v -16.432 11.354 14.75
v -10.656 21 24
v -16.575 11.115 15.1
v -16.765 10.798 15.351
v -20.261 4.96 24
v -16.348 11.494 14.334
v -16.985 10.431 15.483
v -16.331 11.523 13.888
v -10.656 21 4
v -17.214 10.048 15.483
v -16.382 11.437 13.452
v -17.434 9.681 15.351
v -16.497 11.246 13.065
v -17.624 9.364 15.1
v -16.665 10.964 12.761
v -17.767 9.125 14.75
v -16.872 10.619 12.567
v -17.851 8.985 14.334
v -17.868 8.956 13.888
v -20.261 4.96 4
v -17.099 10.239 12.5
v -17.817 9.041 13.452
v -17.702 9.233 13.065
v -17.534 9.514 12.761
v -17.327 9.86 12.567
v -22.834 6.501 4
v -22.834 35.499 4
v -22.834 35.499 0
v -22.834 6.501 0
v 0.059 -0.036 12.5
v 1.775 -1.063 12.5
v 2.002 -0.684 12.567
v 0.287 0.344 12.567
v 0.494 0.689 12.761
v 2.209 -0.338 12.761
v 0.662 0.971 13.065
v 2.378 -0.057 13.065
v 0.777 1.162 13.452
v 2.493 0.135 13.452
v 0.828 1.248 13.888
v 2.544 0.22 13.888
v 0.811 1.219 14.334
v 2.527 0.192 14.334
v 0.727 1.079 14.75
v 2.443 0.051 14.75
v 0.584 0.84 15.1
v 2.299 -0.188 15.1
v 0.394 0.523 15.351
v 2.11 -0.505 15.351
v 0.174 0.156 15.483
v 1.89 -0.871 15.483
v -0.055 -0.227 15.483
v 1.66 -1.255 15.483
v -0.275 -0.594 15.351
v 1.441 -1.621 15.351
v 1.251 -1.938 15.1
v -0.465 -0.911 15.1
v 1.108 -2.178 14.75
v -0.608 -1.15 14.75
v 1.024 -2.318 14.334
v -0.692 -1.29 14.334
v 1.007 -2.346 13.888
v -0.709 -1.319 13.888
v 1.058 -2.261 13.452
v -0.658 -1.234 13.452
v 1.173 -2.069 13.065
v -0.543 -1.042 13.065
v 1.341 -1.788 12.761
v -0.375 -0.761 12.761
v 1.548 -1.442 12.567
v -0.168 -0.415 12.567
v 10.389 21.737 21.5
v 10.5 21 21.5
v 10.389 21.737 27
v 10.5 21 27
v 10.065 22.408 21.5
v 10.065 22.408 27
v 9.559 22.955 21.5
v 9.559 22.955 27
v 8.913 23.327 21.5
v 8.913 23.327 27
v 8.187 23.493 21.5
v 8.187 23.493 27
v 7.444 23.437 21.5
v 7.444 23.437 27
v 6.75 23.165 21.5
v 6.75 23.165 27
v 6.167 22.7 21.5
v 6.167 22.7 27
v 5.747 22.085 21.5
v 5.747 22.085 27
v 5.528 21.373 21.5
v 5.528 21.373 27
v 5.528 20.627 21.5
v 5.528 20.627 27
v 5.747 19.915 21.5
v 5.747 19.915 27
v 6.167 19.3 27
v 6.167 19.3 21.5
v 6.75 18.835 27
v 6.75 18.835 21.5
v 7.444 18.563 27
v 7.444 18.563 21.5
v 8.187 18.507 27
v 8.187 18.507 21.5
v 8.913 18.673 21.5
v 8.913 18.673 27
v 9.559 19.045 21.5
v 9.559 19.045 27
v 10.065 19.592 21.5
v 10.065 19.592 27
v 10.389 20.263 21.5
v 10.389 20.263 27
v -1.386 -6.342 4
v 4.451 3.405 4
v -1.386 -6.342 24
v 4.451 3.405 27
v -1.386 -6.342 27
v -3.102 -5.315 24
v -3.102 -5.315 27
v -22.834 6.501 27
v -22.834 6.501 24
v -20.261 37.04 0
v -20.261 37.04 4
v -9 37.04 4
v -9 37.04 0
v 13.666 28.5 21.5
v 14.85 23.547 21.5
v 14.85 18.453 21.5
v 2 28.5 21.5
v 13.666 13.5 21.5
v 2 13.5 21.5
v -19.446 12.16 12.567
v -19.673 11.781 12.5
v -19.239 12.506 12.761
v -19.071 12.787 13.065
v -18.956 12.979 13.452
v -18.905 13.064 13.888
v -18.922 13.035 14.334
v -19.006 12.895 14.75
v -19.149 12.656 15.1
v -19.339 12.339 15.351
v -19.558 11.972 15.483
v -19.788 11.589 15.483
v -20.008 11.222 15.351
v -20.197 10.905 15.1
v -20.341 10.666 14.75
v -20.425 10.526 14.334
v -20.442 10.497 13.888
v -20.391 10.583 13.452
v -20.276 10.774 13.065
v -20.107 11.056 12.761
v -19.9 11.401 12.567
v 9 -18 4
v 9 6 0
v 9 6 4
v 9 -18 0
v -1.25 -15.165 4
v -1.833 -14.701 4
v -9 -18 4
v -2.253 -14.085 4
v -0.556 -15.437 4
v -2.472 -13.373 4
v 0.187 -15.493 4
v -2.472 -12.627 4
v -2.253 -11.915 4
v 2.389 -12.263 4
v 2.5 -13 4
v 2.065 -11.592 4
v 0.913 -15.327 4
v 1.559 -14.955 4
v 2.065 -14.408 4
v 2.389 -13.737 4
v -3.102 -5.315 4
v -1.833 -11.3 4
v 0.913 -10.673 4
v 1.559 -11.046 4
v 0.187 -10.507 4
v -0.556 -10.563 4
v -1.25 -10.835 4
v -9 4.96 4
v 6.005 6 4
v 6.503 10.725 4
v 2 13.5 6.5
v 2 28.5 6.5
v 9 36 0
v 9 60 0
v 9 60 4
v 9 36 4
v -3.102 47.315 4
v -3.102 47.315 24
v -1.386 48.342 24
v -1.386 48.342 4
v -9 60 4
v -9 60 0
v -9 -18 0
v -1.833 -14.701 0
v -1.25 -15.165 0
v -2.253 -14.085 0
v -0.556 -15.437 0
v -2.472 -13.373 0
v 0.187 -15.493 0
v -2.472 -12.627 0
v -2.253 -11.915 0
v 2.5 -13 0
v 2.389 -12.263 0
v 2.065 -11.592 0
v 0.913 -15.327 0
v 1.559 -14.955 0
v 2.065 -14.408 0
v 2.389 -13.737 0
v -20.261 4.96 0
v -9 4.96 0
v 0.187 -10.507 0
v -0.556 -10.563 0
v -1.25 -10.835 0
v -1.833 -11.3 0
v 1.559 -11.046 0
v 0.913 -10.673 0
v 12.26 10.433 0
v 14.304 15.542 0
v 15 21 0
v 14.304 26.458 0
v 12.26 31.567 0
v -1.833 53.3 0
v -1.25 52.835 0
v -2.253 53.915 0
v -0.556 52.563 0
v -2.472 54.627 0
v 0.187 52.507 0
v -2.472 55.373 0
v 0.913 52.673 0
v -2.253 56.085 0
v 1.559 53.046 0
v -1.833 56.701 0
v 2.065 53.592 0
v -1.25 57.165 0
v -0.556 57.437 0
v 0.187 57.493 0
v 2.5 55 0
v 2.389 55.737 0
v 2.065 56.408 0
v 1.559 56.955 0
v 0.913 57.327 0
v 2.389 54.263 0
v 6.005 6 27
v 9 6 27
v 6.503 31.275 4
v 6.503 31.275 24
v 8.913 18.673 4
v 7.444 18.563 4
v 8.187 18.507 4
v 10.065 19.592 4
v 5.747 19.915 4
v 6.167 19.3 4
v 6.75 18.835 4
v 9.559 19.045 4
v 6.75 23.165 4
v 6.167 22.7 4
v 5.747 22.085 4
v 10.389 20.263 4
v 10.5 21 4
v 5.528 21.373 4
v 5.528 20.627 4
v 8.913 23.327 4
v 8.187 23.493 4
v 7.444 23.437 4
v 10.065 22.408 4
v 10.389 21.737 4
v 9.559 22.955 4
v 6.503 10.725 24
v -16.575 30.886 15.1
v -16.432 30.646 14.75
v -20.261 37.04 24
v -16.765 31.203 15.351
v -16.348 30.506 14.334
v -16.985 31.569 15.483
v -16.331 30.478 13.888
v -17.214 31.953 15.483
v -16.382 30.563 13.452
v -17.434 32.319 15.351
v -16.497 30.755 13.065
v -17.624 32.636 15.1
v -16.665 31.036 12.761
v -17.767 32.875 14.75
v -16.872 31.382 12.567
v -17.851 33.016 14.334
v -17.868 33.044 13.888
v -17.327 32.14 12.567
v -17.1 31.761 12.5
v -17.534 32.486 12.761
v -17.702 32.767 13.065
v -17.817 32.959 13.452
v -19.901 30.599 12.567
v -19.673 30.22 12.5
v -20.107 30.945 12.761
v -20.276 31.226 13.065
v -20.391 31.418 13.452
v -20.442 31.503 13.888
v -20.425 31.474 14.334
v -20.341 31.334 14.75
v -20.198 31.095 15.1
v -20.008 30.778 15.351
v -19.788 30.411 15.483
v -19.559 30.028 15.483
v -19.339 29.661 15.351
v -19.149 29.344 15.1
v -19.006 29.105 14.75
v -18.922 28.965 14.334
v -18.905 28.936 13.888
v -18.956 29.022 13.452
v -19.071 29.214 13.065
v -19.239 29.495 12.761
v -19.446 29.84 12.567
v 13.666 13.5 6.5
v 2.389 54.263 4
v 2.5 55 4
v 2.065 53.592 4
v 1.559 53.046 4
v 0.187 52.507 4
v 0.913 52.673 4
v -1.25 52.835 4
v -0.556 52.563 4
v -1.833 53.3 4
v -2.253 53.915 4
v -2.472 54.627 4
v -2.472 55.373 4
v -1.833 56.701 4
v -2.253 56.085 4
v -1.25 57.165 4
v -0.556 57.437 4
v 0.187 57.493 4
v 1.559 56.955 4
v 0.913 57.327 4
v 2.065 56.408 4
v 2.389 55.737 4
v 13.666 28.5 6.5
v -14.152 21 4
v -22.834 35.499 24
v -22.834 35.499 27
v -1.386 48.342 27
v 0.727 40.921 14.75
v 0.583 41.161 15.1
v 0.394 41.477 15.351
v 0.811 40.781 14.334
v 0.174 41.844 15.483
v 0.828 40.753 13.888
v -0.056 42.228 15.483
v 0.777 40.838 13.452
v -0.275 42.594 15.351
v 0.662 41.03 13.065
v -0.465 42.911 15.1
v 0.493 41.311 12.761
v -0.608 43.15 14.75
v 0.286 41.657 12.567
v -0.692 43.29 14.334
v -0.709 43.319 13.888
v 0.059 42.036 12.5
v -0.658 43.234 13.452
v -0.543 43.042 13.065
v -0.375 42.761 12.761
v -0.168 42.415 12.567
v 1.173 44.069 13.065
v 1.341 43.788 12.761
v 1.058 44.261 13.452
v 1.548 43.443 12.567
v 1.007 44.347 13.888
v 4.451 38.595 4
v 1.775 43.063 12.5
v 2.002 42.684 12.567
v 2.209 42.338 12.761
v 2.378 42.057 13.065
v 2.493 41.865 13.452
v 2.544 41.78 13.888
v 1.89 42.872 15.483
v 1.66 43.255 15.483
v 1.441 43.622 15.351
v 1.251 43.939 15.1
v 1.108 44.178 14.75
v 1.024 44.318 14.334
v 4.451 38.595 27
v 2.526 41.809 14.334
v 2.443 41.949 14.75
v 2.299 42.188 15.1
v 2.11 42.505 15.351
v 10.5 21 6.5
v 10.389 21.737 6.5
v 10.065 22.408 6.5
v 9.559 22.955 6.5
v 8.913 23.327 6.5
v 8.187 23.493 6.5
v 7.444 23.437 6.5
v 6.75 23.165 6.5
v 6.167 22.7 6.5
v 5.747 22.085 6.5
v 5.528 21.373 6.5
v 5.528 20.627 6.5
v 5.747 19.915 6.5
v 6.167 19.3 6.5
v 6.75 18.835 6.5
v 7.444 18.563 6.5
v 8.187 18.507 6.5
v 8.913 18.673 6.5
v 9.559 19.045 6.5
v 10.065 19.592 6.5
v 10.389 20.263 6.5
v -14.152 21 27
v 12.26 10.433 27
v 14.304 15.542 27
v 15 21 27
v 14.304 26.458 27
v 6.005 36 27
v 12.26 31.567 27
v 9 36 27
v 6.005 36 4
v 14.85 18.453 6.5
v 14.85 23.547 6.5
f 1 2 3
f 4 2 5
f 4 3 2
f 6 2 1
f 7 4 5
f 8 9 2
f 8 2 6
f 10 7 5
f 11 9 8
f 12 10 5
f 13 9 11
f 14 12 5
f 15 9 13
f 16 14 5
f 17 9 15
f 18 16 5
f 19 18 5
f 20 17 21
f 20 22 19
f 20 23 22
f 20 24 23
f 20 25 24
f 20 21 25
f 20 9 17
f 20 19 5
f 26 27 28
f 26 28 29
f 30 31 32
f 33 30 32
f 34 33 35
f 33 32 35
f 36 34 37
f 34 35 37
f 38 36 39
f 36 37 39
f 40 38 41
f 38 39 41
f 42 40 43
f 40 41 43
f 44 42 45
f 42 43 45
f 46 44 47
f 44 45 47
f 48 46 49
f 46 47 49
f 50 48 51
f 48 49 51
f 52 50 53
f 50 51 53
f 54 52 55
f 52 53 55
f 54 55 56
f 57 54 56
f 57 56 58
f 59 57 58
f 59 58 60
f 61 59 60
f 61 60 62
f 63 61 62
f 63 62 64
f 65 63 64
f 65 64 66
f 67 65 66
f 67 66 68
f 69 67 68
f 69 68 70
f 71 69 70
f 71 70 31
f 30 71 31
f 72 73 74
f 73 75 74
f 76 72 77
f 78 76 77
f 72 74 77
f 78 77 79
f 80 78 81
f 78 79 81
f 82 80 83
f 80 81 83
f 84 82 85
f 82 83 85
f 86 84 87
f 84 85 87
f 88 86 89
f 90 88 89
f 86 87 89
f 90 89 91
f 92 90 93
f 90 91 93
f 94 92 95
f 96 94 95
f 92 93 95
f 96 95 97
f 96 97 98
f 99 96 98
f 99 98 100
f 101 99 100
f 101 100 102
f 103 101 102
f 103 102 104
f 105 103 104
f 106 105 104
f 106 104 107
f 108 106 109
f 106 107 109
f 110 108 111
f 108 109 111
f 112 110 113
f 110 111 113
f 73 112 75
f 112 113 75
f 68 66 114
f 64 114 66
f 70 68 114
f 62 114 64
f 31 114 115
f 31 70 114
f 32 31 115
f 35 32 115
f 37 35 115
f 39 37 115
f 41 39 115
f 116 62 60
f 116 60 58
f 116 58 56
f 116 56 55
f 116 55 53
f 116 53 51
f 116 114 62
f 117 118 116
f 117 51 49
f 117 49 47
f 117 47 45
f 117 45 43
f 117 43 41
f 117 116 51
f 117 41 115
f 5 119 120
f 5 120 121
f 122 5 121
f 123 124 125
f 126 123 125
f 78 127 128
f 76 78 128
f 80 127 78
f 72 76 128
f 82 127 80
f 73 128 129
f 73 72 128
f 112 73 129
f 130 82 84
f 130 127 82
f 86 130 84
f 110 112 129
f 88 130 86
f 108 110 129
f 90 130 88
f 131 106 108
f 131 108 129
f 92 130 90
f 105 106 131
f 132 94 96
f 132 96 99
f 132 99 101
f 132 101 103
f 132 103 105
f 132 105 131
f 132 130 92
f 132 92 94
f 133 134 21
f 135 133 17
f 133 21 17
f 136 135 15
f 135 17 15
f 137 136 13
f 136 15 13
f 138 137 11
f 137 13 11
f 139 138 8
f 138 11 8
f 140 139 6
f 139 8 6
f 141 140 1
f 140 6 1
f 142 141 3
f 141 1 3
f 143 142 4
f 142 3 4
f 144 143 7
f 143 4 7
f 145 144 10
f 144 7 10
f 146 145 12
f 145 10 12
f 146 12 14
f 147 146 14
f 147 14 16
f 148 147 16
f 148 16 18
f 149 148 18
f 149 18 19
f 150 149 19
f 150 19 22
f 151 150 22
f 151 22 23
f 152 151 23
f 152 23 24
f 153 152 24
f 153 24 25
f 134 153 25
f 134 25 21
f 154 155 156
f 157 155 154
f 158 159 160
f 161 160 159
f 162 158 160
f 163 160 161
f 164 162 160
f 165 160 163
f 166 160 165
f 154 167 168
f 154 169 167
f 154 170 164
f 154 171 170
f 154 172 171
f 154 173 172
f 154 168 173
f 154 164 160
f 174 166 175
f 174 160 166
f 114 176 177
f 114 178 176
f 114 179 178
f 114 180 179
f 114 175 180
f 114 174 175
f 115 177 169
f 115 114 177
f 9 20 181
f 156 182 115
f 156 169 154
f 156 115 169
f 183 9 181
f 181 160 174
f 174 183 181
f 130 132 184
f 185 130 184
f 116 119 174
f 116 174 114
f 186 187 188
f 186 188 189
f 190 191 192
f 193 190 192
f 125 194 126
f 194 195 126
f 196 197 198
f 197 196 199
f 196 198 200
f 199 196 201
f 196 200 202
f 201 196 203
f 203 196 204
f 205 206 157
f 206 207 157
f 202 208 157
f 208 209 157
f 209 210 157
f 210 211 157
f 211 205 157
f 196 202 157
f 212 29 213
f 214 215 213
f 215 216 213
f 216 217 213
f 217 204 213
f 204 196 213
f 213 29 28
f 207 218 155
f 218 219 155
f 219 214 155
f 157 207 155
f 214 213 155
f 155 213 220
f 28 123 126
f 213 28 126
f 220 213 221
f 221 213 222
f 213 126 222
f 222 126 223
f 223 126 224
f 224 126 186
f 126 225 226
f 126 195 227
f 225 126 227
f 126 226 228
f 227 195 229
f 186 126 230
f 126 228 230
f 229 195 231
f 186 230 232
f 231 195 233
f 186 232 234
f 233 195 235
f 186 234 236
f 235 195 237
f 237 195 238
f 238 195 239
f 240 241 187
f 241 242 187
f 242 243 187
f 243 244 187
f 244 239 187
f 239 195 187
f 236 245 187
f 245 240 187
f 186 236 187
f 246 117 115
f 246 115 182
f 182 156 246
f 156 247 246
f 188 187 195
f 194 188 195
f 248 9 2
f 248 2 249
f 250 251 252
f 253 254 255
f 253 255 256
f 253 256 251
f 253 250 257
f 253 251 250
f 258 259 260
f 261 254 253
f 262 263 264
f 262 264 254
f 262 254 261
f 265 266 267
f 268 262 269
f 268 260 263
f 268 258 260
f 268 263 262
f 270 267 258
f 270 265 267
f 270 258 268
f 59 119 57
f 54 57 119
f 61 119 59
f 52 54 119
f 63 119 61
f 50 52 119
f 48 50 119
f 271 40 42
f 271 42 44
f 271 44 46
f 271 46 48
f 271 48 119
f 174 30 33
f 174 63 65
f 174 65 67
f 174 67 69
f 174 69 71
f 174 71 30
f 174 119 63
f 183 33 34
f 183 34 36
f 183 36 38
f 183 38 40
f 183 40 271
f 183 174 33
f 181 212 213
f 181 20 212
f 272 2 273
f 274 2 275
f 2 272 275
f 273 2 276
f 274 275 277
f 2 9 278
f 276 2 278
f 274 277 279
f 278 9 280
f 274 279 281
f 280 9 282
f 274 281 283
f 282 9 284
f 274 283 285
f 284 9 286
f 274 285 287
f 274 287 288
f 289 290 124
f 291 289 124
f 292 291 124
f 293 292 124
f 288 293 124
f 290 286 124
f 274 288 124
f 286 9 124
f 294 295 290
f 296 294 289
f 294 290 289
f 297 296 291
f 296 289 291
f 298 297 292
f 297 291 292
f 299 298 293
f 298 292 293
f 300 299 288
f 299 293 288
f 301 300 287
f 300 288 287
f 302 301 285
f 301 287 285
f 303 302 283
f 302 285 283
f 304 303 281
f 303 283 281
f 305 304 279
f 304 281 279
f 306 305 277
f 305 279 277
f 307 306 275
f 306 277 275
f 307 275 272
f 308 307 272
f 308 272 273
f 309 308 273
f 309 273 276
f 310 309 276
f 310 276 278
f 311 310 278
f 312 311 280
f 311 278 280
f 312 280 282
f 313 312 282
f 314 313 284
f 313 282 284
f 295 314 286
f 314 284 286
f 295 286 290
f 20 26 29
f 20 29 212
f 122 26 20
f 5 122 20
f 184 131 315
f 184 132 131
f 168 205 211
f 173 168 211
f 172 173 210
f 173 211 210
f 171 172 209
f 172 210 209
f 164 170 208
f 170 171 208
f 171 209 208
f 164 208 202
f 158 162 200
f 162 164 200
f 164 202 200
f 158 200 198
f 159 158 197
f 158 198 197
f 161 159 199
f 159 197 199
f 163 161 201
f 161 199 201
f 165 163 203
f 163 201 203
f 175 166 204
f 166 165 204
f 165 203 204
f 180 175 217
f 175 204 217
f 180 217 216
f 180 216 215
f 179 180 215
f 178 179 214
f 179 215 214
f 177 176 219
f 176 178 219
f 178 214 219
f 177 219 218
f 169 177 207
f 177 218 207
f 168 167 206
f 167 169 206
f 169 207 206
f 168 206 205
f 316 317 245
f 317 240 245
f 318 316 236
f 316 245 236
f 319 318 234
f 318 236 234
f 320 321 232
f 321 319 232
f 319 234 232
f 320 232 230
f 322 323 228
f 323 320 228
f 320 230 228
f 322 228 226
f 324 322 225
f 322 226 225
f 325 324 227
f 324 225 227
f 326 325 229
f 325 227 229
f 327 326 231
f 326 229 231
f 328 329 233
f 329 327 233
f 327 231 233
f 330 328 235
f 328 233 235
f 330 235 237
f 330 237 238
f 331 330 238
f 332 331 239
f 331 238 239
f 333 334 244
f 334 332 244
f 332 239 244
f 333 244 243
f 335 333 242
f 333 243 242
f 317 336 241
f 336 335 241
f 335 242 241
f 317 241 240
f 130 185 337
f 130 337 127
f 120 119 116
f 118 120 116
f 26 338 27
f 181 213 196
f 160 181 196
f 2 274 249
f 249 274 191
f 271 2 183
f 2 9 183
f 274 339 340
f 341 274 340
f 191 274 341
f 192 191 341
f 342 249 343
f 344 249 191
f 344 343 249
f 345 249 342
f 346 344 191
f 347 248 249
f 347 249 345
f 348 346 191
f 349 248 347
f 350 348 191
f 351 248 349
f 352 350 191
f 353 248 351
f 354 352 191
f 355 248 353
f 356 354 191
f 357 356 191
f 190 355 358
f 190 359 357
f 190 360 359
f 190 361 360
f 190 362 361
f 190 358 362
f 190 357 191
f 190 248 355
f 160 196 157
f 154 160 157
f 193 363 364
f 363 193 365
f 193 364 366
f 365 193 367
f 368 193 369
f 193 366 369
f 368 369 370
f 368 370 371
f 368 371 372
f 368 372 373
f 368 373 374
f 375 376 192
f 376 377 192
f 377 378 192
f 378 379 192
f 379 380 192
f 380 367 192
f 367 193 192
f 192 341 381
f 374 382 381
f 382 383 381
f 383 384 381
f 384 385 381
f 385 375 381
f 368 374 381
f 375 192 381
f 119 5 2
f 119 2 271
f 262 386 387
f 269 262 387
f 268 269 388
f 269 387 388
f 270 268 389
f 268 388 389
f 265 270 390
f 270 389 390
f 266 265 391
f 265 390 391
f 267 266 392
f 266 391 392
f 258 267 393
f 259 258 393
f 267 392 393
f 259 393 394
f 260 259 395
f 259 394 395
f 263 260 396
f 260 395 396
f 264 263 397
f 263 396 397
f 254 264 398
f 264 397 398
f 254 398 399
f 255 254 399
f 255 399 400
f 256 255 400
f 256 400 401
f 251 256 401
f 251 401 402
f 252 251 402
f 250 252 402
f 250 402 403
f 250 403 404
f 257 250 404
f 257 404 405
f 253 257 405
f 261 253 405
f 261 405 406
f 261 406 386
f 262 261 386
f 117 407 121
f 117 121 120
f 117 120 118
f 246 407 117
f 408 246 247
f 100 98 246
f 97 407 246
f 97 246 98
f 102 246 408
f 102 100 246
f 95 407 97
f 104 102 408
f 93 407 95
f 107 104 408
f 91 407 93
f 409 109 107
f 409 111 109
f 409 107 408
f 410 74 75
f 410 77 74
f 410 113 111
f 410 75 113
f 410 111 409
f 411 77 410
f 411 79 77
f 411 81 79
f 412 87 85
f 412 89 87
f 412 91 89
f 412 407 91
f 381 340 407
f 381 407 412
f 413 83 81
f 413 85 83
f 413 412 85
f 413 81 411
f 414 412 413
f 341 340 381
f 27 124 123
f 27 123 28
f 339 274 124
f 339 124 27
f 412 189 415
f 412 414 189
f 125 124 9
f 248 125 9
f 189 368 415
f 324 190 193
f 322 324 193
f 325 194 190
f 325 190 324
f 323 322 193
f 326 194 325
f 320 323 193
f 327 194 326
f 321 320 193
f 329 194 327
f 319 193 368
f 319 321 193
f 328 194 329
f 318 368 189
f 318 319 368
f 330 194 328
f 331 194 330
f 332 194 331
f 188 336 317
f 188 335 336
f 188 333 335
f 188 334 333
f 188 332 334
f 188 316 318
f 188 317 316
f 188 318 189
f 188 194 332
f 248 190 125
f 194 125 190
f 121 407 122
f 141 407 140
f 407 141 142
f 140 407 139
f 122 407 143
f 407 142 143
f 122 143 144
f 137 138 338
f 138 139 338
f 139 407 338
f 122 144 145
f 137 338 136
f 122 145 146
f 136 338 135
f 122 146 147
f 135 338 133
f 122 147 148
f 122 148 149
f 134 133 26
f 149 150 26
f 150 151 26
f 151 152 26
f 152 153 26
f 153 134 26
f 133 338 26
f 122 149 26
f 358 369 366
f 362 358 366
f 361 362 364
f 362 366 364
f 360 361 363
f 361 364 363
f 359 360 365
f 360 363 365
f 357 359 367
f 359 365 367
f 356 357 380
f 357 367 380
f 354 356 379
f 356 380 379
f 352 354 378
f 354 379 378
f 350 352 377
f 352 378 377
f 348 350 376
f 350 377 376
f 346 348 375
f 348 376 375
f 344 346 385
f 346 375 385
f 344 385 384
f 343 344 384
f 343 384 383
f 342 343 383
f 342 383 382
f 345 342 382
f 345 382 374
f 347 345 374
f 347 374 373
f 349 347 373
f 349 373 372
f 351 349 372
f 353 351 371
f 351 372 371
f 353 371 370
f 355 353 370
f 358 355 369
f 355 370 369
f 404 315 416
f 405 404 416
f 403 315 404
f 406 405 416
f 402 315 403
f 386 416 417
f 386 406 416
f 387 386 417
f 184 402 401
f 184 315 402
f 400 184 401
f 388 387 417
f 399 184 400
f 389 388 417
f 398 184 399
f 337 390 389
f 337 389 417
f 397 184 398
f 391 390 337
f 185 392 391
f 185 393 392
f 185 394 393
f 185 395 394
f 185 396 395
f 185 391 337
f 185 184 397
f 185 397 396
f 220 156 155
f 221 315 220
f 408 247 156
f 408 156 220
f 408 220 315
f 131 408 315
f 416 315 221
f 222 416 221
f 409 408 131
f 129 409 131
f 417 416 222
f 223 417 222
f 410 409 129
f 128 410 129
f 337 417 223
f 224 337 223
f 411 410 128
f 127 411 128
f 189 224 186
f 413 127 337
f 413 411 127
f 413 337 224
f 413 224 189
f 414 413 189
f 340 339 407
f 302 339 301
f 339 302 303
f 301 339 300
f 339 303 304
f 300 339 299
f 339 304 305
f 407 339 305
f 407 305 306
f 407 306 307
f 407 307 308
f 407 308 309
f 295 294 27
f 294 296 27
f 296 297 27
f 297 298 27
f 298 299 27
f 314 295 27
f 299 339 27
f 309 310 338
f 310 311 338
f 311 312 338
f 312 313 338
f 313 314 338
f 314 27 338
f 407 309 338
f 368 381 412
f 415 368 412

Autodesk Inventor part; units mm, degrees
ref_plane "YZ Plane" through (0, 0, 0) normal (1, 0, 0) x (0, 1, 0)
sketch "Sketch1" plane through (0, 0, 0) normal (0, 0, 1) x (1, 0, 0)
  circle A0 centre (-0.0001, 55.0001) radius 2.5 projected
  line L0 (-9, 60.0001) -> (-9, 34.0001) projected
  line L1 (-9, 34.0001) -> (-5.0001, 34.0001) projected
  line L2 (-5.0001, 34.0001) -> (-5.0001, 45.0001) projected
  line L3 (-5.0001, 45.0001) -> (4.9999, 45.0001) projected
  line L4 (4.9999, 45.0001) -> (4.9999, 34.0001) projected
  line L5 (4.9999, 34.0001) -> (8.9999, 34.0001) projected
  line L6 (8.9999, 34.0001) -> (8.9999, 60.0001) projected
  line L7 (8.9999, 60.0001) -> (-9, 60.0001) projected
  line L8 (-9, 8) -> (-9, -18) projected
  line L9 (-5, -18) -> (-5, -8) projected
  circle A1 centre (-0.0001, -13.0001) radius 2.5 projected
  line L10 (8.9999, -18.0001) -> (8.9999, 7.9999) projected
  line L11 (8.9999, 7.9999) -> (4.9999, 7.9999) projected
  line L12 (4.9999, 7.9999) -> (4.9999, 2.5001) projected
  line L13 (5, -3) -> (-5.0001, -3.0001) projected
  line L14 (-5.0001, -3.0001) -> (-5.0001, 7.9999) projected
  line L15 (-5.0001, 7.9999) -> (-9, 7.9999) projected
  line L16 (-9, -18.0001) -> (8.9999, -18.0001) projected
  line L17 (8.9999, 60.0001) -> (-9, 60.0001)
  line L18 (-9, 60.0001) -> (-9, -18)
  line L19 (-9, -18) -> (8.9999, -18)
  line L20 (8.9999, -18) -> (8.9999, 60.0001)
  circle A2 centre (-0.0001, 55.0001) radius 2.5
  circle A3 centre (-0.0001, -13.0001) radius 2.5
  line L21 (-9, 7.9999) -> (-9, -18.0001) projected
  line L22 (4.9999, 2.5001) -> (5, -3) projected
  point P0 (0, 0)
  dimension "d0" = 4
  dimension "d1" = 0
extrude "Extrusion1" add sketch "Sketch1" along normal blind 4
sketch "Sketch2" plane through (0, 0, 4) normal (0, 0, 1) x (1, 0, 0)
  circle A0 centre (-55.3, -73.0192) radius 2.5 projected
  circle A1 centre (-55.3001, 115.0193) radius 2.5 projected
  line L0 (-55.3, -73.0192) -> (33.584, 75.4143)
  line L1 (-55.3001, 115.0193) -> (26.1085, -20.9304)
  line L2 (-9, 60) -> (-9, -18) projected
  line L3 (-9, 21) -> (62.9573, 21)
  line L4 (1, 21) -> (-7.5794, 15.8625)
  line L5 (-55.3001, 115.0193) -> (-50.1626, 106.4399)
  line L6 (-50.1626, 106.4399) -> (-41.5832, 111.5774)
  line L7 (-50.1626, 106.4399) -> (-58.742, 101.3024)
  line L8 (-7.5794, 15.8625) -> (-58.742, 101.3024)
  line L9 (1, 21) -> (9.5794, 26.1375)
  line L10 (9.5794, 26.1375) -> (-41.5832, 111.5774)
  line L11 (1, 21) -> (-7.5794, 26.1375)
  line L12 (1, 21) -> (9.5794, 15.8625)
  line L13 (-55.3, -73.0192) -> (-50.1625, -64.4398)
  line L14 (-93.1275, -68.5) -> (-47.8, -94.6699) projected
  line L15 (-50.1625, -64.4398) -> (-41.5831, -69.5773)
  line L16 (-50.1625, -64.4398) -> (-58.742, -59.3023)
  line L17 (-41.5831, -69.5773) -> (9.5794, 15.8625)
  line L18 (-7.5794, 26.1375) -> (-58.742, -59.3023)
  line L19 (-10.6558, 21) -> (6.503, 31.2749)
  line L20 (-10.6558, 21) -> (6.503, 10.7251)
  circle A2 centre (-0.0001, -13.0001) radius 2.5 projected
  circle A3 centre (-0.0001, -13.0001) radius 5
  circle A4 centre (-0.0001, 55.0001) radius 2.5 projected
  circle A5 centre (-0.0001, 55.0001) radius 5
  line L21 (8.9999, 60.0001) -> (-9, 60.0001) projected
  line L22 (-9, -18.0001) -> (8.9999, -18.0001) projected
  line L23 (-20.2607, 4.9602) -> (12.7451, -14.8042)
  line L24 (-20.2607, 37.0398) -> (12.7451, 56.8042)
  line L25 (-20.2607, 4.9602) -> (-22.8345, 6.5014)
  line L26 (-9, 21) -> (-33.1607, 21)
  line L27 (-22.8345, 6.5014) -> (-14.1525, 21)
  line L28 (-20.2607, 37.0398) -> (-22.8345, 35.4986)
  line L29 (-22.8345, 35.4986) -> (-14.1525, 21)
  line L30 (6.503, 10.7251) -> (8.9999, 9.2299)
  line L31 (8.9999, -18.0001) -> (8.9999, 60.0001) projected
  line L32 (6.503, 31.2749) -> (8.9999, 32.7701)
  line L33 (8.9999, 32.7701) -> (-0.605, 48.8099)
  line L34 (8.9999, 9.2299) -> (-0.605, -6.8099)
  line L35 (8.9999, 32.7701) -> (8.9999, 9.2299)
  line L36 (-22.8345, 6.5014) -> (-22.8345, 35.4986)
  point P0 (0, 0)
  point P1 (-20.2607, 37.0398)
  point P2 (6.503, 10.7251)
  point P3 (-3.1018, -5.3148)
  point P4 (8.524, 8.4352)
  point P5 (7.516, 10.1185)
  point P6 (-3.1019, 47.3148)
  point P7 (6.503, 31.2749)
  point P8 (-2.0764, 26.1375)
  point P9 (-11.6813, 42.1773)
  point P10 (6.8279, 11.2676)
  point P11 (8.9999, 14.8947)
  point P12 (8.9999, 16.2096)
  point P13 (6.503, 10.7251)
  point P14 (8.9999, 25.7904)
  point P15 (6.503, 31.2749)
  point P16 (8.9999, 27.1053)
  point P17 (8.9999, 32.7701)
  point P18 (8.9999, 32.7704)
  point P19 (8.9999, 9.2299)
  point P20 (8.9999, 7.6404)
  point P21 (8.9999, 9.2296)
  point P22 (8.9999, 54.5615)
  point P23 (8.9999, -12.5615)
  dimension "d0" = 4
  dimension "d1" = 0
  dimension "d2" = 10
  dimension "d3" = 10
  dimension "d4" = 10
  dimension "d5" = 10
  dimension "d6" = 10
  dimension "d7" = 10
  dimension "d8" = 10
  dimension "d9" = 10
  dimension "d10" = 10
  dimension "d11" = 10
  dimension "d12" = 10
  dimension "d13" = 20
  dimension "d14" = 20
  dimension "d15" = 3
  dimension "d16" = 3
extrude "Extrusion2" add sketch "Sketch2" along normal blind 20 contours L25 L27 L26 L18 | L20 L4 L0 | L0 L1 L17 L20 | L26 L29 L28 L8 | L26 L2 L20 | L19 L2 L26 | L17 L30 L1 L34 L23 | L1 L19 L10 L0 | L11 L19 L1 | L12 L31 L17 L1 | L4 L20 L2 L3 | L9 L31 L3 | L0 L10 L31 L9 | L3 L2 L19 L11 | L3 L31 L12 | L17 L1 L30 | L34 L1 L31 L23 | L10 L32 L0 | L0 L32 L31 L10 | L17 L31 L30 L1 | L30 L34 L1 | L34 L31 L1 | L32 L10 L24 L33 L0 | L0 L33 L32 | L33 L24 L31 L0 | L0 L31 L33
sketch "Sketch3" plane through (0, 0, 4) normal (0, 0, -1) x (-1, 0, 0)
  line L0 (10.6558, 21) -> (20.2607, 37.0398) projected
  line L1 (20.2607, 37.0398) -> (8.9915, 37.0398)
  line L2 (20.2607, 4.9602) -> (10.6558, 21) projected
  line L3 (20.2607, 4.9602) -> (9, 4.9602)
  line L4 (9, 20.0085) -> (9, -18) projected
  line L5 (22.8345, 35.4986) -> (14.1525, 21) projected
  line L6 (22.8345, 6.5014) -> (20.2607, 4.9602) projected
  line L7 (22.8345, 35.4986) -> (22.8345, 6.5014)
  line L8 (9, 60) -> (9, -18) projected
  line L9 (10.6558, 21) -> (9, 20.0085) projected
  line L10 (9, 21.9915) -> (10.6558, 21) projected
  line L11 (22.8345, 6.5014) -> (20.2607, 4.9602) projected
  line L12 (14.1525, 21) -> (22.8345, 6.5014) projected
  line L13 (22.8345, 35.4986) -> (14.1525, 21) projected
  line L14 (20.2607, 37.0398) -> (22.8345, 35.4986) projected
  line L15 (10.6558, 21) -> (20.2607, 37.0398) projected
  line L16 (20.2607, 4.9602) -> (10.6558, 21) projected
  line L17 (-8.9999, 60.0001) -> (9, 60.0001) projected
  line L18 (-8.9999, -18.0001) -> (-8.9999, 60.0001) projected
  line L19 (9, -18.0001) -> (-8.9999, -18.0001) projected
  circle A0 centre (0.0001, -13.0001) radius 2.5 projected
  circle A1 centre (0.0001, 55.0001) radius 2.5 projected
  line L20 (9, 60.0001) -> (9, -18.0001) projected
  point P0 (0, 0)
  point P1 (9, 37.0398)
  dimension "d0" = 4
  dimension "d1" = 0
ref_plane "Work Plane1" through (-20.2583, -25.7942, 0) normal (0, 0, 1) x (1, 0, 0)
extrude "Extrusion3" add sketch "Sketch3" along normal up to surface (4 mm away) contours L10 L8 L1 L0 | L0 L14 L5 L12 L6 L2 | L2 L3 L4 L9 | L9 L8 L10 | L7 L12 L5
ref_plane "Work Plane4" through (8.9999, -18.0001, 0) normal (1, 0, 0) x (0, 0, -1)
sketch "Sketch12" plane through (0, 0, 24) normal (0, 0, 1) x (1, 0, 0)
  line L0 (-3.1018, -5.3148) -> (8.9999, -12.5615) projected
  line L1 (-14.1525, 21) -> (-22.8345, 6.5014) projected
  line L2 (8.9999, -12.5615) -> (-22.8345, 6.5014)
  line L3 (-22.8345, 6.5014) -> (-14.1525, 21)
  line L4 (-22.8345, 35.4986) -> (-14.1525, 21) projected
  line L5 (-14.1525, 21) -> (-22.8345, 35.4986)
  line L6 (-22.8345, 35.4986) -> (8.9999, 54.5615)
  line L7 (8.9999, 54.5615) -> (8.9999, -12.5615)
  point P0 (0, 0)
extrude "Extrusion12" add sketch "Sketch12" along normal blind 3
sketch "Sketch13" plane through (0, 0, 27) normal (0, 0, 1) x (1, 0, 0)
  line L0 (8.9999, -12.5615) -> (8.9999, 54.5615) projected
  line L1 (8.9999, 21) -> (14.9999, 21)
  line L2 (8.9999, 21) -> (8.9999, 6)
  line L3 (8.9999, 21) -> (8.9999, 36)
  arc A0 (8.9999, 6) -> (8.9999, 36) centre (-6.7501, 21) ccw
  point P0 (0, 0)
  dimension "d52" = 6
  dimension "d53" = 15
  dimension "d54" = 15
extrude "Extrusion13" add sketch "Sketch13" against normal up to surface (27 mm away)
sketch "Sketch14" plane through (0, 0, 27) normal (0, 0, 1) x (1, 0, 0)
  arc A0 (8.9999, 6) -> (8.9999, 36) centre (-6.7501, 21) ccw projected
  line L0 (14.9999, 21) -> (7.9999, 21)
  circle A1 centre (7.9999, 21) radius 2.5
  point P0 (0, 0)
  dimension "d57" = 7
  dimension "d58" = 5
extrude "Extrusion14" cut sketch "Sketch14" against normal up to surface (23 mm away)
sketch "Sketch15" plane through (8.9999, -18.0001, 4) normal (1, 0, 0) x (0, 0, -1)
  line L0 (-23, 54.0001) -> (-23, 24.0001) projected
  line L1 (-23, 39.0001) -> (-10, 39.0001)
  line L2 (0, 39.0001) -> (-20, 39.0001) projected
  line L3 (-17.5, 31.5001) -> (-2.5, 31.5001)
  line L4 (-2.5, 31.5001) -> (-2.5, 46.5001)
  line L5 (-2.5, 46.5001) -> (-17.5, 46.5001)
  line L6 (-17.5, 46.5001) -> (-17.5, 31.5001)
  line L7 (-17.5, 31.5001) -> (-2.5, 46.5001) construction
  line L8 (-2.5, 31.5001) -> (-17.5, 46.5001) construction
  point P0 (4, 18.0001)
  dimension "d61" = 15
  dimension "d62" = 15
extrude "Extrusion15" cut sketch "Sketch15" along normal blind 10 and the other way blind 7
sketch "Sketch16" plane through (0, 0, 27) normal (0, 0, 1) x (1, 0, 0)
  line L0 (-3.1018, -5.3148) -> (6.503, 10.7251) projected
  line L1 (6.503, 31.2749) -> (-3.1019, 47.3148) projected
  line L2 (-3.1018, -5.3148) -> (-1.386, -6.3423)
  line L3 (-22.8345, 6.5014) -> (8.9999, -12.5615) projected
  line L4 (-1.386, -6.3423) -> (4.4507, 3.4048)
  line L5 (8.9999, -12.5615) -> (8.9999, 6) projected
  line L6 (8.9999, 6) -> (-9.8503, 6)
  line L7 (4.4507, 3.4048) -> (6.0048, 6)
  line L8 (-22.8345, 35.4986) -> (-14.1525, 21) projected
  line L9 (-14.1525, 21) -> (17.1457, 21)
  line L10 (-22.8345, 35.4986) -> (8.9999, 54.5615)
  line L11 (-1.386, 48.3423) -> (4.4507, 38.5952)
  line L12 (8.9999, 54.5615) -> (8.9999, 36)
  line L13 (8.9999, 36) -> (-9.8503, 36)
  line L14 (4.4507, 38.5952) -> (6.0048, 36)
  point P0 (0, 0)
  dimension "d67" = 2
extrude "Extrusion16" cut sketch "Sketch16" against normal up to surface (23 mm away) contours L4 L7 L6 L5 L3 | L14 L11 L10 L12 L13
sketch "Sketch17" plane through (6.0048, 6, 27) normal (0.8579416, -0.5137472, 0) x (0, 0, -1)
  line L0 (0, 2.5134) -> (0, -14.3859) projected
  line L1 (0, -8.2326) -> (13, -8.2326)
  circle A0 centre (13, -8.2326) radius 1.5
  point P0 (27, -8.2326)
  dimension "d71" = 13
  dimension "d72" = 3
extrude "Extrusion17" cut sketch "Sketch17" against normal through all
sketch "Sketch18" plane through (6.0048, 36, 27) normal (0.8579416, 0.5137472, 0) x (0, 0, -1)
  line L0 (23, 14.3859) -> (0, 14.3859) projected
  line L1 (0, 14.3859) -> (0, 8.2329)
  line L2 (0, 14.3859) -> (0, -2.5134) projected
  line L3 (0, 8.2329) -> (13, 8.2329)
  circle A0 centre (13, 8.2329) radius 1.5
  point P0 (27, -27.801)
  dimension "d75" = 6.153
  dimension "d76" = 13
  dimension "d77" = 3
extrude "Extrusion18" cut sketch "Sketch18" against normal through all
properties part number "2020_top_guide_mnt" material "PET Plastic"
